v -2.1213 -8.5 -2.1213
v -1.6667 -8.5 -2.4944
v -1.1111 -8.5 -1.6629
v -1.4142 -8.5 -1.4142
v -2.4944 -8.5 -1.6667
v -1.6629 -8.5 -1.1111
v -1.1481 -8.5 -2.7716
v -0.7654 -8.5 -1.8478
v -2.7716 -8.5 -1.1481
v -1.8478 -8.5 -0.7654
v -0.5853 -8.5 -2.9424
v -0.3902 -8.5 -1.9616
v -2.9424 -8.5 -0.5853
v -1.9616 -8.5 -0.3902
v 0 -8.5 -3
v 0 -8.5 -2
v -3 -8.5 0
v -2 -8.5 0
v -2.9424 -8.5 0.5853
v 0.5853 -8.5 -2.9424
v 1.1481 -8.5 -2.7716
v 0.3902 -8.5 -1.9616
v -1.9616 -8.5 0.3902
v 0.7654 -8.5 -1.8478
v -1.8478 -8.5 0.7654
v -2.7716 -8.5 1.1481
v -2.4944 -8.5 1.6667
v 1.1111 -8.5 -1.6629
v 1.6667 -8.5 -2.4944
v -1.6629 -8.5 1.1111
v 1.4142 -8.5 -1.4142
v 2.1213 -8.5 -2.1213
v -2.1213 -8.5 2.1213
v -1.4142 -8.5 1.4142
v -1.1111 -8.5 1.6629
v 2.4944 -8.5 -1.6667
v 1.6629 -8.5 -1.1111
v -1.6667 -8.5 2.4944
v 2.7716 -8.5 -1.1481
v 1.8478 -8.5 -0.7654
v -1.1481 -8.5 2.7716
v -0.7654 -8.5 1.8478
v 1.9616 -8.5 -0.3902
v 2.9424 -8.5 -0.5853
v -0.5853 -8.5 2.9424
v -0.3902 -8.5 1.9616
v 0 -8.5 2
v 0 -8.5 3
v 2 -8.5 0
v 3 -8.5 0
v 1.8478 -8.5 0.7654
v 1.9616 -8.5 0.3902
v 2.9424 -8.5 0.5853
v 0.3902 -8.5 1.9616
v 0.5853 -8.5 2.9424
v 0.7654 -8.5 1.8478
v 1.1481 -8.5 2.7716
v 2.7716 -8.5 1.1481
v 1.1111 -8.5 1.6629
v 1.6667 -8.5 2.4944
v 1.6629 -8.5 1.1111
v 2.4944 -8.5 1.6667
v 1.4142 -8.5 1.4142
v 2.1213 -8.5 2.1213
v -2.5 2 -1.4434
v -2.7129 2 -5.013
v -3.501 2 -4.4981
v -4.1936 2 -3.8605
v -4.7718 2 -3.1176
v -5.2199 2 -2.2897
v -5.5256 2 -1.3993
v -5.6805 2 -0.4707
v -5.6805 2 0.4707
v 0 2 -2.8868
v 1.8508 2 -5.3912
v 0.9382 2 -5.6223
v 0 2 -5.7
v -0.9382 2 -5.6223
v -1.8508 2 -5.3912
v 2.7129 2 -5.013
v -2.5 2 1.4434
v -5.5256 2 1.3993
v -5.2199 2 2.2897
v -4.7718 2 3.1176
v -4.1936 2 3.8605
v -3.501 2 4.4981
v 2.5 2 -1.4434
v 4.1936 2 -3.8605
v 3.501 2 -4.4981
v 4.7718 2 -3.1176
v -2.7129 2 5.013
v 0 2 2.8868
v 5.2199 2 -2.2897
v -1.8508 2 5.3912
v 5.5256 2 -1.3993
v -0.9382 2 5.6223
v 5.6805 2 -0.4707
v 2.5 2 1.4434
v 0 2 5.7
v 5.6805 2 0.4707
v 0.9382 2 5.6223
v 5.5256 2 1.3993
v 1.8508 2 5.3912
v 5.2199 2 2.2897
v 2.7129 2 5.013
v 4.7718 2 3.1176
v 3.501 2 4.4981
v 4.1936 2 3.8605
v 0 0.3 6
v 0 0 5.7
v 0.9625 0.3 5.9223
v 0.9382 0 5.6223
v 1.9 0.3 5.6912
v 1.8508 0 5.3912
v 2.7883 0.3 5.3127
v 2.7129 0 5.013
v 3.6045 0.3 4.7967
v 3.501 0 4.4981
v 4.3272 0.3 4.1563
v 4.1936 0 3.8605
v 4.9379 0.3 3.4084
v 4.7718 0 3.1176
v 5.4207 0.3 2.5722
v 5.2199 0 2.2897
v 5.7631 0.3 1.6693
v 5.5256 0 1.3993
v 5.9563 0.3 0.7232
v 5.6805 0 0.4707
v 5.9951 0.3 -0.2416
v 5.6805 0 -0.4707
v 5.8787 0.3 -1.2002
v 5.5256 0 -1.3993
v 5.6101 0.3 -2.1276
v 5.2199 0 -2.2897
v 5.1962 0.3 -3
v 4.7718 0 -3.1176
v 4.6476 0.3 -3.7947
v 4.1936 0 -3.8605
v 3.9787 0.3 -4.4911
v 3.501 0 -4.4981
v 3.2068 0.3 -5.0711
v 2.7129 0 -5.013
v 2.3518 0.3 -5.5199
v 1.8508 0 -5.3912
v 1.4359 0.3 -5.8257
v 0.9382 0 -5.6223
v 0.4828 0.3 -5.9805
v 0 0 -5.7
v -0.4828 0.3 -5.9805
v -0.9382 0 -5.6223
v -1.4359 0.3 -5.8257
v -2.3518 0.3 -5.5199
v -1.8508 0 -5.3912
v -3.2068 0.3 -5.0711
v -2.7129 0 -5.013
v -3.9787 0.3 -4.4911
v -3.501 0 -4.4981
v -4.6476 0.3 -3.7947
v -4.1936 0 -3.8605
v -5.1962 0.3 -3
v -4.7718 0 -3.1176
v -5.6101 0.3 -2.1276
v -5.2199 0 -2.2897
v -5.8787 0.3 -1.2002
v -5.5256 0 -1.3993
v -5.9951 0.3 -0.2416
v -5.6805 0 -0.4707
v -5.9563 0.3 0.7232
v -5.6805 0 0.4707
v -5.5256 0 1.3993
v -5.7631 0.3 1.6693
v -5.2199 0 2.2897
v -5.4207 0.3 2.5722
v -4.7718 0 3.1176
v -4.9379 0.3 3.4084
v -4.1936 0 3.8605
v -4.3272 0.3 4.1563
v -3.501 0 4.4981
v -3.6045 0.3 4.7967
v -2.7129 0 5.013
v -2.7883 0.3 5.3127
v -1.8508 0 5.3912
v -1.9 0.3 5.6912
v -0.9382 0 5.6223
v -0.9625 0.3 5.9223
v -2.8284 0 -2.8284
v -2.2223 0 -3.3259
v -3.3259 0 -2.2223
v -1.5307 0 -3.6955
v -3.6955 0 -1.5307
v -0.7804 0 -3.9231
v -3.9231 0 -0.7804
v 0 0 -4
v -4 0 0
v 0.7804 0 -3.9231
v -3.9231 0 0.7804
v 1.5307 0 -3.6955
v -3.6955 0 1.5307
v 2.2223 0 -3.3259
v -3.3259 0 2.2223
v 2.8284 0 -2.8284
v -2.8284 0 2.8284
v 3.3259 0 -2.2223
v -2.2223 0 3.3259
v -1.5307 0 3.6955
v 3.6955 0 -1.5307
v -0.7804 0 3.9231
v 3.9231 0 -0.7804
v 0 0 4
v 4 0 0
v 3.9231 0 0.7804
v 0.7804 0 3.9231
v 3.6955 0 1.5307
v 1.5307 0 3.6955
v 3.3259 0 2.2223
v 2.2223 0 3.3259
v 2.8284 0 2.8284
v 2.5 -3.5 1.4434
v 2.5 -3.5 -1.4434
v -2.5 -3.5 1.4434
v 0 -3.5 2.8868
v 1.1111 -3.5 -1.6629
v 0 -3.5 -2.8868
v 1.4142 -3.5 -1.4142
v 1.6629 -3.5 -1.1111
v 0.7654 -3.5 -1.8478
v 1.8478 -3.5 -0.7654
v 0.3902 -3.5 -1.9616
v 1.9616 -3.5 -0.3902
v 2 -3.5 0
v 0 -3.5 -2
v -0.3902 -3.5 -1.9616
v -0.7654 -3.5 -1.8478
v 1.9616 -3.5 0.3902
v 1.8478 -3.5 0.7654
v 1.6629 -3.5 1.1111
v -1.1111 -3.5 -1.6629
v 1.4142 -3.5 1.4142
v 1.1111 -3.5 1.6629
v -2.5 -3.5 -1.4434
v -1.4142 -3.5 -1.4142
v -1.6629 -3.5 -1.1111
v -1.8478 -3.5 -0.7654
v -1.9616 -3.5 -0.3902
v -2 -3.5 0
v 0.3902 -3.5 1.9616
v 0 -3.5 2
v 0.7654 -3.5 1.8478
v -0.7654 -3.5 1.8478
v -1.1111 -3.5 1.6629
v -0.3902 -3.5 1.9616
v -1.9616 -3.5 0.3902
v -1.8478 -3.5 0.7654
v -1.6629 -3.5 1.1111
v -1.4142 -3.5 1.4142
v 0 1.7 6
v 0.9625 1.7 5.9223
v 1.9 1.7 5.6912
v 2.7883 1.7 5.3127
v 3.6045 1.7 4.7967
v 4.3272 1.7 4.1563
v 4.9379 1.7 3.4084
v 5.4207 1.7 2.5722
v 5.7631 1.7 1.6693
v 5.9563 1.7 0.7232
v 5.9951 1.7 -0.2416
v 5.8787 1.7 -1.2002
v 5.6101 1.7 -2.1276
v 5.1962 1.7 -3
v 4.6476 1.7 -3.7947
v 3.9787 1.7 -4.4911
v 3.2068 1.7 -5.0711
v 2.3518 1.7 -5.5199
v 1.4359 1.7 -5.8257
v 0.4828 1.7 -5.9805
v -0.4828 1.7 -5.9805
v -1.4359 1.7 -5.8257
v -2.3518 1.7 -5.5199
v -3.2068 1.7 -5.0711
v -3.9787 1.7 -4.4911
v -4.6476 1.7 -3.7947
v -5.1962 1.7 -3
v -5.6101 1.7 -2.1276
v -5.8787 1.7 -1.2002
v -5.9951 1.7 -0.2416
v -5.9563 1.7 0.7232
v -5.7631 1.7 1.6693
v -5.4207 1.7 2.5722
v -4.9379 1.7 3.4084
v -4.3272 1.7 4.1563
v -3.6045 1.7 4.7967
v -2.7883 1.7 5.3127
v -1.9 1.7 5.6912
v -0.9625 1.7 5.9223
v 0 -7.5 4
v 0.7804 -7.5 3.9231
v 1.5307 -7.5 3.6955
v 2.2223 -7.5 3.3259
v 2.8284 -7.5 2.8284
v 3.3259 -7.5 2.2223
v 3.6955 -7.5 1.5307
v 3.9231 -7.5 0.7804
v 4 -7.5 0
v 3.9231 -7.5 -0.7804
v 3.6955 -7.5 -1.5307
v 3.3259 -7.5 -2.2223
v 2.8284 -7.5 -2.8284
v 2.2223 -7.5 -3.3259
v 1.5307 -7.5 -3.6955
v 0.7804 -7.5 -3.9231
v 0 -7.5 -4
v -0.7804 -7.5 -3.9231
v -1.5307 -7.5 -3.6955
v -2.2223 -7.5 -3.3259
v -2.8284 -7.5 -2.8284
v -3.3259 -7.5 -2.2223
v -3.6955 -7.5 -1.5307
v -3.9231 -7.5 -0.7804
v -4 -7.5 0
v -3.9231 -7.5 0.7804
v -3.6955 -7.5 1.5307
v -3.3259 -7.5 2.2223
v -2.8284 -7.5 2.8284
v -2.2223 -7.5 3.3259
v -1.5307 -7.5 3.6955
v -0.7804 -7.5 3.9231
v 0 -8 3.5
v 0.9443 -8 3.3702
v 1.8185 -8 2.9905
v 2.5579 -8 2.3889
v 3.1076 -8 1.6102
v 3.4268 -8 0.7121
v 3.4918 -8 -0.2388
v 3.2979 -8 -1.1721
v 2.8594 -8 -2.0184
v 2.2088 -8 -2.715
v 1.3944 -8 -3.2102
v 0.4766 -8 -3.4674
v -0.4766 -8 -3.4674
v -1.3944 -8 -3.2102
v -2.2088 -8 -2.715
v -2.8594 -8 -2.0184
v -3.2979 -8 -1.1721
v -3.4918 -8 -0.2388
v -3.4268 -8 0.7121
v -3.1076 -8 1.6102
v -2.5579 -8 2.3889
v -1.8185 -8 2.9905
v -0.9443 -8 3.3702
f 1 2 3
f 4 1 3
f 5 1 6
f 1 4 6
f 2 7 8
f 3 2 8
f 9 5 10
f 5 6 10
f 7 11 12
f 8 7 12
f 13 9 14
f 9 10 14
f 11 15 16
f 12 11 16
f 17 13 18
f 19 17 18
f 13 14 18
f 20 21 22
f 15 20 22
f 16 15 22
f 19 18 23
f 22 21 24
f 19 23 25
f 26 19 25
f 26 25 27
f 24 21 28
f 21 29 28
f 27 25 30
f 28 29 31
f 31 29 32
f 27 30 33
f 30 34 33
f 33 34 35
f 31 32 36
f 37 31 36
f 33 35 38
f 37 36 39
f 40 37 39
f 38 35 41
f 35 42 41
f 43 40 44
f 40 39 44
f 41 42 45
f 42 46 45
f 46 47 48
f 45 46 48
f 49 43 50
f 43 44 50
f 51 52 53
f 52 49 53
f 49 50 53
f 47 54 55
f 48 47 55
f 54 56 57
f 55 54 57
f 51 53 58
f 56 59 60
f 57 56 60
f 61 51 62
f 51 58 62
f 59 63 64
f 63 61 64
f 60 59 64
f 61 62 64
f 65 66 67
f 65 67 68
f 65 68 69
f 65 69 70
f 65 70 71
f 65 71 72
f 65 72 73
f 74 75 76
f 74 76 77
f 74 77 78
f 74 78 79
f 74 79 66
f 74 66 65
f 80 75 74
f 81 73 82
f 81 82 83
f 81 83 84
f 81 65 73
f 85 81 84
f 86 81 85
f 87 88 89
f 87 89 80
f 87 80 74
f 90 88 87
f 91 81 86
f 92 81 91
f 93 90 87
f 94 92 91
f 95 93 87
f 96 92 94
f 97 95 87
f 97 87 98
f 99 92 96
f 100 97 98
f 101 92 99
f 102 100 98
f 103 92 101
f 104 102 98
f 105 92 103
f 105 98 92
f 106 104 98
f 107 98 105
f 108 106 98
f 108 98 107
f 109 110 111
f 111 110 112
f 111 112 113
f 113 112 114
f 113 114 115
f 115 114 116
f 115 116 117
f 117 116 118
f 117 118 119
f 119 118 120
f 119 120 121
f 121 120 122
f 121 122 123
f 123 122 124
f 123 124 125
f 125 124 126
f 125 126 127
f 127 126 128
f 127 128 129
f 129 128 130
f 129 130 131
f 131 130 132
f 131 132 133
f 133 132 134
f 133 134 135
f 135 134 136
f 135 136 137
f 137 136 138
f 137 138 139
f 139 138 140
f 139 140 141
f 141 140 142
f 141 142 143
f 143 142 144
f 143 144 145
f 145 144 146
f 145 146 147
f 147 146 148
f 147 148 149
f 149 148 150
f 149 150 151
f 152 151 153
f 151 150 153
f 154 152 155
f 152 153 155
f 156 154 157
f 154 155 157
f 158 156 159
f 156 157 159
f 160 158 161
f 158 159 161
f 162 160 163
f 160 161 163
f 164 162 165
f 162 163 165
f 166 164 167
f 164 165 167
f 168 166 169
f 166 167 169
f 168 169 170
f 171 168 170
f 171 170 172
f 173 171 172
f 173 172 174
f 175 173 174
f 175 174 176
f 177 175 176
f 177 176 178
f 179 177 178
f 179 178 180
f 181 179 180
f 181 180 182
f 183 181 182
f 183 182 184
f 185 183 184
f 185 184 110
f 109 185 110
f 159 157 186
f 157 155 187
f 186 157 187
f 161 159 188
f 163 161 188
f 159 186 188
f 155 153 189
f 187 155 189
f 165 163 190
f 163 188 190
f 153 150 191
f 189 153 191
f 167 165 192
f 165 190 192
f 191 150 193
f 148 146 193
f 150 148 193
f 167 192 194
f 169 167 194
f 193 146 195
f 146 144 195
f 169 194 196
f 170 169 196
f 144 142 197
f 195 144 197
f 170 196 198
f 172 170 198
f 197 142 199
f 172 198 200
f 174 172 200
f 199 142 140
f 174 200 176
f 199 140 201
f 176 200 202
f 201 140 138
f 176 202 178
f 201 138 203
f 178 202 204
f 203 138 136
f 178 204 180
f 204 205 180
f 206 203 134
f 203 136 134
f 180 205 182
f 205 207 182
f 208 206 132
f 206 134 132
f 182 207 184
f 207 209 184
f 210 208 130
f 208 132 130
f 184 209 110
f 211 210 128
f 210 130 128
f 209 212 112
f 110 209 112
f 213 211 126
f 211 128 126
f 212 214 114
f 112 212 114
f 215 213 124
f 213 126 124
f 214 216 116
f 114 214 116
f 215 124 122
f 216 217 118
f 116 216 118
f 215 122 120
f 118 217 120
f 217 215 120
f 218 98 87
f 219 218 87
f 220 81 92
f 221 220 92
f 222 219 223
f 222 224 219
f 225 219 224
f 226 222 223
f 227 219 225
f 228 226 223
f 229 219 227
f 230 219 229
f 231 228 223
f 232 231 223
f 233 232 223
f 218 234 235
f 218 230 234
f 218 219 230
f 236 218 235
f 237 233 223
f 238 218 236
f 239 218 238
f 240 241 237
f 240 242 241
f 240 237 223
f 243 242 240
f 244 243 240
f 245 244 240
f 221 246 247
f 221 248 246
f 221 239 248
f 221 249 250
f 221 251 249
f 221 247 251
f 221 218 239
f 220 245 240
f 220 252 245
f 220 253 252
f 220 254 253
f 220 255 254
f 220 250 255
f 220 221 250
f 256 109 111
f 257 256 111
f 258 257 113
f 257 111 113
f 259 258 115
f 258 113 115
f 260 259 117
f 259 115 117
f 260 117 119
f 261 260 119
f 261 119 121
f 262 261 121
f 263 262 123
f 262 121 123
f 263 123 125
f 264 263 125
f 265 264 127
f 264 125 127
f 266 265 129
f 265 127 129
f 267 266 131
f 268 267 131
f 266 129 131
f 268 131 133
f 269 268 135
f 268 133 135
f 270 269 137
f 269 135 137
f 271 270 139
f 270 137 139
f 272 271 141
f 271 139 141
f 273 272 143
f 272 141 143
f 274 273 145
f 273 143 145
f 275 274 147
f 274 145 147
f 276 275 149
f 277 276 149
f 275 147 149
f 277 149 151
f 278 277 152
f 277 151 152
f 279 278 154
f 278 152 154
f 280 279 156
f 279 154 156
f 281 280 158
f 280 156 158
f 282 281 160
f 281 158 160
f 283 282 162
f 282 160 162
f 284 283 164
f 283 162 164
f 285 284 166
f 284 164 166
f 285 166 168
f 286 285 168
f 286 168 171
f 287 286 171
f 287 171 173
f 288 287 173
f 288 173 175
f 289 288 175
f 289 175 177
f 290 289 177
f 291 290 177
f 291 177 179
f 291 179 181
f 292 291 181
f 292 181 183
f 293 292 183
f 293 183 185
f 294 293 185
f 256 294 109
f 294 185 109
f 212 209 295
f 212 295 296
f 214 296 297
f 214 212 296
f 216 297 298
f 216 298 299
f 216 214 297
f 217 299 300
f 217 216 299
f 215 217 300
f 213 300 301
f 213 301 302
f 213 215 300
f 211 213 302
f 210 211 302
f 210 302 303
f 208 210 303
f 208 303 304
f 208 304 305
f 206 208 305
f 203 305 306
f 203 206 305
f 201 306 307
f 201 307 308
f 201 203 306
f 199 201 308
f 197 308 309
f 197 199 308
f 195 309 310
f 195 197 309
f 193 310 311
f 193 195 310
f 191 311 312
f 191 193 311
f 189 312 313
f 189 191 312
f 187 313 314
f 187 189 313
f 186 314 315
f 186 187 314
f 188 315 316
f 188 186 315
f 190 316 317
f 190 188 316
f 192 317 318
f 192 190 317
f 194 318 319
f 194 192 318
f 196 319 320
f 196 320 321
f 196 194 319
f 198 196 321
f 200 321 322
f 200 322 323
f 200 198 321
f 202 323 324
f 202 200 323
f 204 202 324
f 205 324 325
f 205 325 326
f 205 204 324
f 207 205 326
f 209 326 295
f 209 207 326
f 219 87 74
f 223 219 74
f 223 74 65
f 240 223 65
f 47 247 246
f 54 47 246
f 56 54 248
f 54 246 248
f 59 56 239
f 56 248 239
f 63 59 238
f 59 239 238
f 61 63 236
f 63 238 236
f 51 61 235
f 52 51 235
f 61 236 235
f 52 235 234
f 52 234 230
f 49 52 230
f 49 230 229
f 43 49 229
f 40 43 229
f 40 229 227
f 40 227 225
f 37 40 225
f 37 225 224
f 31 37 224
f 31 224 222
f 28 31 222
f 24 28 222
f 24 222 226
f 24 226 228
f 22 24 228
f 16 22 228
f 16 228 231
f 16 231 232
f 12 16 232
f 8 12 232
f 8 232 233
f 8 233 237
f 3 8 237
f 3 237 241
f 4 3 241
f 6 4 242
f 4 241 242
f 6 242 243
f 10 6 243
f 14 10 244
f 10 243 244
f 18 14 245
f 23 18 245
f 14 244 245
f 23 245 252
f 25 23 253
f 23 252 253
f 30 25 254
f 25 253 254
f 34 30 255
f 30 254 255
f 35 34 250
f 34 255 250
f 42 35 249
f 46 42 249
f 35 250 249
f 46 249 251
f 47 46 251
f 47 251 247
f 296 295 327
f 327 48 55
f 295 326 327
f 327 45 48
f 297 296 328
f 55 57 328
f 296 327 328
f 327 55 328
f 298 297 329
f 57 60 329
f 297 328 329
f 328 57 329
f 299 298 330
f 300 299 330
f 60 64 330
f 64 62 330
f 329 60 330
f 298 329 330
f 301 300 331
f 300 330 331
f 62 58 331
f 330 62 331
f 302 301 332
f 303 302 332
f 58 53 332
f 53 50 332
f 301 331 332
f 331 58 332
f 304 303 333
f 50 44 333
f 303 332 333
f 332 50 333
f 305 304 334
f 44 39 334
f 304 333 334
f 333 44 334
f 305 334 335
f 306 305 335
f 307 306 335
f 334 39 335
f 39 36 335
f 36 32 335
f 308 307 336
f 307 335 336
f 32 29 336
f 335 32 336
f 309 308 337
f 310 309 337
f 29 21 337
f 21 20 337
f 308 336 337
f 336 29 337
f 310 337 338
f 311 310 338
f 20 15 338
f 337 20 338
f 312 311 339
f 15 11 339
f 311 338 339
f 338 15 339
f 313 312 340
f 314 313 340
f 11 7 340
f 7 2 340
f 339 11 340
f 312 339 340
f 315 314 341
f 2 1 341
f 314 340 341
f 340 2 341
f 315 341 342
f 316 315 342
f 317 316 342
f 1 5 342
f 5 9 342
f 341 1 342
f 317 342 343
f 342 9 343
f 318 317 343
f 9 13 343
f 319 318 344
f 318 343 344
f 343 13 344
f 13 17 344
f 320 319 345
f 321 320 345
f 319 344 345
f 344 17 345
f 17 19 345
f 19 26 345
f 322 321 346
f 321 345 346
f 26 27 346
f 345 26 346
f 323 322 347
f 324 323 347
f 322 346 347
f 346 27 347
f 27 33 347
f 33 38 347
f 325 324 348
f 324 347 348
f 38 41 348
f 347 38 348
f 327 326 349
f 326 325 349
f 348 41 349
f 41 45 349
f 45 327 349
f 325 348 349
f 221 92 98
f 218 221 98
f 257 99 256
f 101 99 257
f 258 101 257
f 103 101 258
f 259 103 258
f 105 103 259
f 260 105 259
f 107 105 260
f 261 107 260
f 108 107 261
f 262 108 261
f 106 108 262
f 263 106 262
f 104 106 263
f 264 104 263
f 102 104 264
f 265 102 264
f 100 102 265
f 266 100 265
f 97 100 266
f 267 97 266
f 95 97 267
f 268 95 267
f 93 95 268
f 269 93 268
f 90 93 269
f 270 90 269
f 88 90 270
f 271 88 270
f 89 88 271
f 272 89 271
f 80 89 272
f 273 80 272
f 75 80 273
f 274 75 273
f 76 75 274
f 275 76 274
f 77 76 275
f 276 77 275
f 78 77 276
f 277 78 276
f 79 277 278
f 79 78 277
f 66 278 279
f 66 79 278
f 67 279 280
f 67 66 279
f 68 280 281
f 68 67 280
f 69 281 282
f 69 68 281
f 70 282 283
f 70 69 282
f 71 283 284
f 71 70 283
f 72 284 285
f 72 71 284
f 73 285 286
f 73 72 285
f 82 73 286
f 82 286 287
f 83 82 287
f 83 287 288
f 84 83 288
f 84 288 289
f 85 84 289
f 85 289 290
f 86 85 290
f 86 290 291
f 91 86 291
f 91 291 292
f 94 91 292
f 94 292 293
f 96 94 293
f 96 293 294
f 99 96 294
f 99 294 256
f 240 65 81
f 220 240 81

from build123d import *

# Parameters (mm, degrees)
ESQUISSE2_R             = 4
EXTRUSION1_DEPTH        = 8.5
ESQUISSE3_R             = 6
EXTRUSION2_DEPTH        = 2
ESQUISSE4_R             = 2
ENL_V_MAT_EXTRU_1_DEPTH = 11.5
ENL_V_MAT_EXTRU_2_DEPTH = 5.5
CHANFREIN1_SIZE         = 0.3
CHANFREIN2_SIZE         = 1


with BuildPart() as part:
    # Esquisse2 → Extrusion1 (new body)
    with BuildSketch(Plane(origin=(0, 0, 0), x_dir=(1, 0, 0), z_dir=(0, 1, 0))):
        with Locations(Location((0, 0, 0), (0, 0, 270))):  # turned: the seam where the file's is
            Circle(ESQUISSE2_R)
    extrude(amount=-EXTRUSION1_DEPTH)

    # Esquisse3 → Extrusion2 (add)
    with BuildSketch(Plane(origin=(0, 0, 0), x_dir=(-1, 0, 0), z_dir=(0, 1, 0))):
        with Locations(Location((0, 0, 0), (0, 0, 90))):  # turned: the seam where the file's is
            Circle(ESQUISSE3_R)
    extrude(amount=EXTRUSION2_DEPTH)

    # Esquisse4 → Enlèv. mat.-Extru.1 (cut, through all)
    with BuildSketch(Plane(origin=(0, 2, 0), x_dir=(-1, 0, 0), z_dir=(0, 1, 0))):
        with Locations(Location((0, 0, 0), (0, 0, 90))):  # turned: the seam where the file's is
            Circle(ESQUISSE4_R)
    extrude(amount=-ENL_V_MAT_EXTRU_1_DEPTH, mode=Mode.SUBTRACT)

    # Esquisse5 → Enlèv. mat.-Extru.2 (cut)
    with BuildSketch(Plane(origin=(0, 2, 0), x_dir=(-1, 0, 0), z_dir=(0, 1, 0))):
        Polygon((0, -2.886751346), (2.5, -1.443375673), (2.5, 1.443375673), (0, 2.886751346), (-2.5, 1.443375673), (-2.5, -1.443375673), align=None)
    extrude(amount=-ENL_V_MAT_EXTRU_2_DEPTH, mode=Mode.SUBTRACT)

    # Chanfrein1
    chanfrein1_edges = [part.edges().sort_by_distance(p)[0] for p in [
        (0, 0, -6),
        (0, 2, -6),
    ]]
    chamfer(chanfrein1_edges, length=CHANFREIN1_SIZE)

    # Chanfrein2
    chanfrein2_edges = [part.edges().sort_by_distance(p)[0] for p in [
        (0, -8.5, -4),
    ]]
    chamfer(chanfrein2_edges, length=CHANFREIN2_SIZE)


solid = part.part
